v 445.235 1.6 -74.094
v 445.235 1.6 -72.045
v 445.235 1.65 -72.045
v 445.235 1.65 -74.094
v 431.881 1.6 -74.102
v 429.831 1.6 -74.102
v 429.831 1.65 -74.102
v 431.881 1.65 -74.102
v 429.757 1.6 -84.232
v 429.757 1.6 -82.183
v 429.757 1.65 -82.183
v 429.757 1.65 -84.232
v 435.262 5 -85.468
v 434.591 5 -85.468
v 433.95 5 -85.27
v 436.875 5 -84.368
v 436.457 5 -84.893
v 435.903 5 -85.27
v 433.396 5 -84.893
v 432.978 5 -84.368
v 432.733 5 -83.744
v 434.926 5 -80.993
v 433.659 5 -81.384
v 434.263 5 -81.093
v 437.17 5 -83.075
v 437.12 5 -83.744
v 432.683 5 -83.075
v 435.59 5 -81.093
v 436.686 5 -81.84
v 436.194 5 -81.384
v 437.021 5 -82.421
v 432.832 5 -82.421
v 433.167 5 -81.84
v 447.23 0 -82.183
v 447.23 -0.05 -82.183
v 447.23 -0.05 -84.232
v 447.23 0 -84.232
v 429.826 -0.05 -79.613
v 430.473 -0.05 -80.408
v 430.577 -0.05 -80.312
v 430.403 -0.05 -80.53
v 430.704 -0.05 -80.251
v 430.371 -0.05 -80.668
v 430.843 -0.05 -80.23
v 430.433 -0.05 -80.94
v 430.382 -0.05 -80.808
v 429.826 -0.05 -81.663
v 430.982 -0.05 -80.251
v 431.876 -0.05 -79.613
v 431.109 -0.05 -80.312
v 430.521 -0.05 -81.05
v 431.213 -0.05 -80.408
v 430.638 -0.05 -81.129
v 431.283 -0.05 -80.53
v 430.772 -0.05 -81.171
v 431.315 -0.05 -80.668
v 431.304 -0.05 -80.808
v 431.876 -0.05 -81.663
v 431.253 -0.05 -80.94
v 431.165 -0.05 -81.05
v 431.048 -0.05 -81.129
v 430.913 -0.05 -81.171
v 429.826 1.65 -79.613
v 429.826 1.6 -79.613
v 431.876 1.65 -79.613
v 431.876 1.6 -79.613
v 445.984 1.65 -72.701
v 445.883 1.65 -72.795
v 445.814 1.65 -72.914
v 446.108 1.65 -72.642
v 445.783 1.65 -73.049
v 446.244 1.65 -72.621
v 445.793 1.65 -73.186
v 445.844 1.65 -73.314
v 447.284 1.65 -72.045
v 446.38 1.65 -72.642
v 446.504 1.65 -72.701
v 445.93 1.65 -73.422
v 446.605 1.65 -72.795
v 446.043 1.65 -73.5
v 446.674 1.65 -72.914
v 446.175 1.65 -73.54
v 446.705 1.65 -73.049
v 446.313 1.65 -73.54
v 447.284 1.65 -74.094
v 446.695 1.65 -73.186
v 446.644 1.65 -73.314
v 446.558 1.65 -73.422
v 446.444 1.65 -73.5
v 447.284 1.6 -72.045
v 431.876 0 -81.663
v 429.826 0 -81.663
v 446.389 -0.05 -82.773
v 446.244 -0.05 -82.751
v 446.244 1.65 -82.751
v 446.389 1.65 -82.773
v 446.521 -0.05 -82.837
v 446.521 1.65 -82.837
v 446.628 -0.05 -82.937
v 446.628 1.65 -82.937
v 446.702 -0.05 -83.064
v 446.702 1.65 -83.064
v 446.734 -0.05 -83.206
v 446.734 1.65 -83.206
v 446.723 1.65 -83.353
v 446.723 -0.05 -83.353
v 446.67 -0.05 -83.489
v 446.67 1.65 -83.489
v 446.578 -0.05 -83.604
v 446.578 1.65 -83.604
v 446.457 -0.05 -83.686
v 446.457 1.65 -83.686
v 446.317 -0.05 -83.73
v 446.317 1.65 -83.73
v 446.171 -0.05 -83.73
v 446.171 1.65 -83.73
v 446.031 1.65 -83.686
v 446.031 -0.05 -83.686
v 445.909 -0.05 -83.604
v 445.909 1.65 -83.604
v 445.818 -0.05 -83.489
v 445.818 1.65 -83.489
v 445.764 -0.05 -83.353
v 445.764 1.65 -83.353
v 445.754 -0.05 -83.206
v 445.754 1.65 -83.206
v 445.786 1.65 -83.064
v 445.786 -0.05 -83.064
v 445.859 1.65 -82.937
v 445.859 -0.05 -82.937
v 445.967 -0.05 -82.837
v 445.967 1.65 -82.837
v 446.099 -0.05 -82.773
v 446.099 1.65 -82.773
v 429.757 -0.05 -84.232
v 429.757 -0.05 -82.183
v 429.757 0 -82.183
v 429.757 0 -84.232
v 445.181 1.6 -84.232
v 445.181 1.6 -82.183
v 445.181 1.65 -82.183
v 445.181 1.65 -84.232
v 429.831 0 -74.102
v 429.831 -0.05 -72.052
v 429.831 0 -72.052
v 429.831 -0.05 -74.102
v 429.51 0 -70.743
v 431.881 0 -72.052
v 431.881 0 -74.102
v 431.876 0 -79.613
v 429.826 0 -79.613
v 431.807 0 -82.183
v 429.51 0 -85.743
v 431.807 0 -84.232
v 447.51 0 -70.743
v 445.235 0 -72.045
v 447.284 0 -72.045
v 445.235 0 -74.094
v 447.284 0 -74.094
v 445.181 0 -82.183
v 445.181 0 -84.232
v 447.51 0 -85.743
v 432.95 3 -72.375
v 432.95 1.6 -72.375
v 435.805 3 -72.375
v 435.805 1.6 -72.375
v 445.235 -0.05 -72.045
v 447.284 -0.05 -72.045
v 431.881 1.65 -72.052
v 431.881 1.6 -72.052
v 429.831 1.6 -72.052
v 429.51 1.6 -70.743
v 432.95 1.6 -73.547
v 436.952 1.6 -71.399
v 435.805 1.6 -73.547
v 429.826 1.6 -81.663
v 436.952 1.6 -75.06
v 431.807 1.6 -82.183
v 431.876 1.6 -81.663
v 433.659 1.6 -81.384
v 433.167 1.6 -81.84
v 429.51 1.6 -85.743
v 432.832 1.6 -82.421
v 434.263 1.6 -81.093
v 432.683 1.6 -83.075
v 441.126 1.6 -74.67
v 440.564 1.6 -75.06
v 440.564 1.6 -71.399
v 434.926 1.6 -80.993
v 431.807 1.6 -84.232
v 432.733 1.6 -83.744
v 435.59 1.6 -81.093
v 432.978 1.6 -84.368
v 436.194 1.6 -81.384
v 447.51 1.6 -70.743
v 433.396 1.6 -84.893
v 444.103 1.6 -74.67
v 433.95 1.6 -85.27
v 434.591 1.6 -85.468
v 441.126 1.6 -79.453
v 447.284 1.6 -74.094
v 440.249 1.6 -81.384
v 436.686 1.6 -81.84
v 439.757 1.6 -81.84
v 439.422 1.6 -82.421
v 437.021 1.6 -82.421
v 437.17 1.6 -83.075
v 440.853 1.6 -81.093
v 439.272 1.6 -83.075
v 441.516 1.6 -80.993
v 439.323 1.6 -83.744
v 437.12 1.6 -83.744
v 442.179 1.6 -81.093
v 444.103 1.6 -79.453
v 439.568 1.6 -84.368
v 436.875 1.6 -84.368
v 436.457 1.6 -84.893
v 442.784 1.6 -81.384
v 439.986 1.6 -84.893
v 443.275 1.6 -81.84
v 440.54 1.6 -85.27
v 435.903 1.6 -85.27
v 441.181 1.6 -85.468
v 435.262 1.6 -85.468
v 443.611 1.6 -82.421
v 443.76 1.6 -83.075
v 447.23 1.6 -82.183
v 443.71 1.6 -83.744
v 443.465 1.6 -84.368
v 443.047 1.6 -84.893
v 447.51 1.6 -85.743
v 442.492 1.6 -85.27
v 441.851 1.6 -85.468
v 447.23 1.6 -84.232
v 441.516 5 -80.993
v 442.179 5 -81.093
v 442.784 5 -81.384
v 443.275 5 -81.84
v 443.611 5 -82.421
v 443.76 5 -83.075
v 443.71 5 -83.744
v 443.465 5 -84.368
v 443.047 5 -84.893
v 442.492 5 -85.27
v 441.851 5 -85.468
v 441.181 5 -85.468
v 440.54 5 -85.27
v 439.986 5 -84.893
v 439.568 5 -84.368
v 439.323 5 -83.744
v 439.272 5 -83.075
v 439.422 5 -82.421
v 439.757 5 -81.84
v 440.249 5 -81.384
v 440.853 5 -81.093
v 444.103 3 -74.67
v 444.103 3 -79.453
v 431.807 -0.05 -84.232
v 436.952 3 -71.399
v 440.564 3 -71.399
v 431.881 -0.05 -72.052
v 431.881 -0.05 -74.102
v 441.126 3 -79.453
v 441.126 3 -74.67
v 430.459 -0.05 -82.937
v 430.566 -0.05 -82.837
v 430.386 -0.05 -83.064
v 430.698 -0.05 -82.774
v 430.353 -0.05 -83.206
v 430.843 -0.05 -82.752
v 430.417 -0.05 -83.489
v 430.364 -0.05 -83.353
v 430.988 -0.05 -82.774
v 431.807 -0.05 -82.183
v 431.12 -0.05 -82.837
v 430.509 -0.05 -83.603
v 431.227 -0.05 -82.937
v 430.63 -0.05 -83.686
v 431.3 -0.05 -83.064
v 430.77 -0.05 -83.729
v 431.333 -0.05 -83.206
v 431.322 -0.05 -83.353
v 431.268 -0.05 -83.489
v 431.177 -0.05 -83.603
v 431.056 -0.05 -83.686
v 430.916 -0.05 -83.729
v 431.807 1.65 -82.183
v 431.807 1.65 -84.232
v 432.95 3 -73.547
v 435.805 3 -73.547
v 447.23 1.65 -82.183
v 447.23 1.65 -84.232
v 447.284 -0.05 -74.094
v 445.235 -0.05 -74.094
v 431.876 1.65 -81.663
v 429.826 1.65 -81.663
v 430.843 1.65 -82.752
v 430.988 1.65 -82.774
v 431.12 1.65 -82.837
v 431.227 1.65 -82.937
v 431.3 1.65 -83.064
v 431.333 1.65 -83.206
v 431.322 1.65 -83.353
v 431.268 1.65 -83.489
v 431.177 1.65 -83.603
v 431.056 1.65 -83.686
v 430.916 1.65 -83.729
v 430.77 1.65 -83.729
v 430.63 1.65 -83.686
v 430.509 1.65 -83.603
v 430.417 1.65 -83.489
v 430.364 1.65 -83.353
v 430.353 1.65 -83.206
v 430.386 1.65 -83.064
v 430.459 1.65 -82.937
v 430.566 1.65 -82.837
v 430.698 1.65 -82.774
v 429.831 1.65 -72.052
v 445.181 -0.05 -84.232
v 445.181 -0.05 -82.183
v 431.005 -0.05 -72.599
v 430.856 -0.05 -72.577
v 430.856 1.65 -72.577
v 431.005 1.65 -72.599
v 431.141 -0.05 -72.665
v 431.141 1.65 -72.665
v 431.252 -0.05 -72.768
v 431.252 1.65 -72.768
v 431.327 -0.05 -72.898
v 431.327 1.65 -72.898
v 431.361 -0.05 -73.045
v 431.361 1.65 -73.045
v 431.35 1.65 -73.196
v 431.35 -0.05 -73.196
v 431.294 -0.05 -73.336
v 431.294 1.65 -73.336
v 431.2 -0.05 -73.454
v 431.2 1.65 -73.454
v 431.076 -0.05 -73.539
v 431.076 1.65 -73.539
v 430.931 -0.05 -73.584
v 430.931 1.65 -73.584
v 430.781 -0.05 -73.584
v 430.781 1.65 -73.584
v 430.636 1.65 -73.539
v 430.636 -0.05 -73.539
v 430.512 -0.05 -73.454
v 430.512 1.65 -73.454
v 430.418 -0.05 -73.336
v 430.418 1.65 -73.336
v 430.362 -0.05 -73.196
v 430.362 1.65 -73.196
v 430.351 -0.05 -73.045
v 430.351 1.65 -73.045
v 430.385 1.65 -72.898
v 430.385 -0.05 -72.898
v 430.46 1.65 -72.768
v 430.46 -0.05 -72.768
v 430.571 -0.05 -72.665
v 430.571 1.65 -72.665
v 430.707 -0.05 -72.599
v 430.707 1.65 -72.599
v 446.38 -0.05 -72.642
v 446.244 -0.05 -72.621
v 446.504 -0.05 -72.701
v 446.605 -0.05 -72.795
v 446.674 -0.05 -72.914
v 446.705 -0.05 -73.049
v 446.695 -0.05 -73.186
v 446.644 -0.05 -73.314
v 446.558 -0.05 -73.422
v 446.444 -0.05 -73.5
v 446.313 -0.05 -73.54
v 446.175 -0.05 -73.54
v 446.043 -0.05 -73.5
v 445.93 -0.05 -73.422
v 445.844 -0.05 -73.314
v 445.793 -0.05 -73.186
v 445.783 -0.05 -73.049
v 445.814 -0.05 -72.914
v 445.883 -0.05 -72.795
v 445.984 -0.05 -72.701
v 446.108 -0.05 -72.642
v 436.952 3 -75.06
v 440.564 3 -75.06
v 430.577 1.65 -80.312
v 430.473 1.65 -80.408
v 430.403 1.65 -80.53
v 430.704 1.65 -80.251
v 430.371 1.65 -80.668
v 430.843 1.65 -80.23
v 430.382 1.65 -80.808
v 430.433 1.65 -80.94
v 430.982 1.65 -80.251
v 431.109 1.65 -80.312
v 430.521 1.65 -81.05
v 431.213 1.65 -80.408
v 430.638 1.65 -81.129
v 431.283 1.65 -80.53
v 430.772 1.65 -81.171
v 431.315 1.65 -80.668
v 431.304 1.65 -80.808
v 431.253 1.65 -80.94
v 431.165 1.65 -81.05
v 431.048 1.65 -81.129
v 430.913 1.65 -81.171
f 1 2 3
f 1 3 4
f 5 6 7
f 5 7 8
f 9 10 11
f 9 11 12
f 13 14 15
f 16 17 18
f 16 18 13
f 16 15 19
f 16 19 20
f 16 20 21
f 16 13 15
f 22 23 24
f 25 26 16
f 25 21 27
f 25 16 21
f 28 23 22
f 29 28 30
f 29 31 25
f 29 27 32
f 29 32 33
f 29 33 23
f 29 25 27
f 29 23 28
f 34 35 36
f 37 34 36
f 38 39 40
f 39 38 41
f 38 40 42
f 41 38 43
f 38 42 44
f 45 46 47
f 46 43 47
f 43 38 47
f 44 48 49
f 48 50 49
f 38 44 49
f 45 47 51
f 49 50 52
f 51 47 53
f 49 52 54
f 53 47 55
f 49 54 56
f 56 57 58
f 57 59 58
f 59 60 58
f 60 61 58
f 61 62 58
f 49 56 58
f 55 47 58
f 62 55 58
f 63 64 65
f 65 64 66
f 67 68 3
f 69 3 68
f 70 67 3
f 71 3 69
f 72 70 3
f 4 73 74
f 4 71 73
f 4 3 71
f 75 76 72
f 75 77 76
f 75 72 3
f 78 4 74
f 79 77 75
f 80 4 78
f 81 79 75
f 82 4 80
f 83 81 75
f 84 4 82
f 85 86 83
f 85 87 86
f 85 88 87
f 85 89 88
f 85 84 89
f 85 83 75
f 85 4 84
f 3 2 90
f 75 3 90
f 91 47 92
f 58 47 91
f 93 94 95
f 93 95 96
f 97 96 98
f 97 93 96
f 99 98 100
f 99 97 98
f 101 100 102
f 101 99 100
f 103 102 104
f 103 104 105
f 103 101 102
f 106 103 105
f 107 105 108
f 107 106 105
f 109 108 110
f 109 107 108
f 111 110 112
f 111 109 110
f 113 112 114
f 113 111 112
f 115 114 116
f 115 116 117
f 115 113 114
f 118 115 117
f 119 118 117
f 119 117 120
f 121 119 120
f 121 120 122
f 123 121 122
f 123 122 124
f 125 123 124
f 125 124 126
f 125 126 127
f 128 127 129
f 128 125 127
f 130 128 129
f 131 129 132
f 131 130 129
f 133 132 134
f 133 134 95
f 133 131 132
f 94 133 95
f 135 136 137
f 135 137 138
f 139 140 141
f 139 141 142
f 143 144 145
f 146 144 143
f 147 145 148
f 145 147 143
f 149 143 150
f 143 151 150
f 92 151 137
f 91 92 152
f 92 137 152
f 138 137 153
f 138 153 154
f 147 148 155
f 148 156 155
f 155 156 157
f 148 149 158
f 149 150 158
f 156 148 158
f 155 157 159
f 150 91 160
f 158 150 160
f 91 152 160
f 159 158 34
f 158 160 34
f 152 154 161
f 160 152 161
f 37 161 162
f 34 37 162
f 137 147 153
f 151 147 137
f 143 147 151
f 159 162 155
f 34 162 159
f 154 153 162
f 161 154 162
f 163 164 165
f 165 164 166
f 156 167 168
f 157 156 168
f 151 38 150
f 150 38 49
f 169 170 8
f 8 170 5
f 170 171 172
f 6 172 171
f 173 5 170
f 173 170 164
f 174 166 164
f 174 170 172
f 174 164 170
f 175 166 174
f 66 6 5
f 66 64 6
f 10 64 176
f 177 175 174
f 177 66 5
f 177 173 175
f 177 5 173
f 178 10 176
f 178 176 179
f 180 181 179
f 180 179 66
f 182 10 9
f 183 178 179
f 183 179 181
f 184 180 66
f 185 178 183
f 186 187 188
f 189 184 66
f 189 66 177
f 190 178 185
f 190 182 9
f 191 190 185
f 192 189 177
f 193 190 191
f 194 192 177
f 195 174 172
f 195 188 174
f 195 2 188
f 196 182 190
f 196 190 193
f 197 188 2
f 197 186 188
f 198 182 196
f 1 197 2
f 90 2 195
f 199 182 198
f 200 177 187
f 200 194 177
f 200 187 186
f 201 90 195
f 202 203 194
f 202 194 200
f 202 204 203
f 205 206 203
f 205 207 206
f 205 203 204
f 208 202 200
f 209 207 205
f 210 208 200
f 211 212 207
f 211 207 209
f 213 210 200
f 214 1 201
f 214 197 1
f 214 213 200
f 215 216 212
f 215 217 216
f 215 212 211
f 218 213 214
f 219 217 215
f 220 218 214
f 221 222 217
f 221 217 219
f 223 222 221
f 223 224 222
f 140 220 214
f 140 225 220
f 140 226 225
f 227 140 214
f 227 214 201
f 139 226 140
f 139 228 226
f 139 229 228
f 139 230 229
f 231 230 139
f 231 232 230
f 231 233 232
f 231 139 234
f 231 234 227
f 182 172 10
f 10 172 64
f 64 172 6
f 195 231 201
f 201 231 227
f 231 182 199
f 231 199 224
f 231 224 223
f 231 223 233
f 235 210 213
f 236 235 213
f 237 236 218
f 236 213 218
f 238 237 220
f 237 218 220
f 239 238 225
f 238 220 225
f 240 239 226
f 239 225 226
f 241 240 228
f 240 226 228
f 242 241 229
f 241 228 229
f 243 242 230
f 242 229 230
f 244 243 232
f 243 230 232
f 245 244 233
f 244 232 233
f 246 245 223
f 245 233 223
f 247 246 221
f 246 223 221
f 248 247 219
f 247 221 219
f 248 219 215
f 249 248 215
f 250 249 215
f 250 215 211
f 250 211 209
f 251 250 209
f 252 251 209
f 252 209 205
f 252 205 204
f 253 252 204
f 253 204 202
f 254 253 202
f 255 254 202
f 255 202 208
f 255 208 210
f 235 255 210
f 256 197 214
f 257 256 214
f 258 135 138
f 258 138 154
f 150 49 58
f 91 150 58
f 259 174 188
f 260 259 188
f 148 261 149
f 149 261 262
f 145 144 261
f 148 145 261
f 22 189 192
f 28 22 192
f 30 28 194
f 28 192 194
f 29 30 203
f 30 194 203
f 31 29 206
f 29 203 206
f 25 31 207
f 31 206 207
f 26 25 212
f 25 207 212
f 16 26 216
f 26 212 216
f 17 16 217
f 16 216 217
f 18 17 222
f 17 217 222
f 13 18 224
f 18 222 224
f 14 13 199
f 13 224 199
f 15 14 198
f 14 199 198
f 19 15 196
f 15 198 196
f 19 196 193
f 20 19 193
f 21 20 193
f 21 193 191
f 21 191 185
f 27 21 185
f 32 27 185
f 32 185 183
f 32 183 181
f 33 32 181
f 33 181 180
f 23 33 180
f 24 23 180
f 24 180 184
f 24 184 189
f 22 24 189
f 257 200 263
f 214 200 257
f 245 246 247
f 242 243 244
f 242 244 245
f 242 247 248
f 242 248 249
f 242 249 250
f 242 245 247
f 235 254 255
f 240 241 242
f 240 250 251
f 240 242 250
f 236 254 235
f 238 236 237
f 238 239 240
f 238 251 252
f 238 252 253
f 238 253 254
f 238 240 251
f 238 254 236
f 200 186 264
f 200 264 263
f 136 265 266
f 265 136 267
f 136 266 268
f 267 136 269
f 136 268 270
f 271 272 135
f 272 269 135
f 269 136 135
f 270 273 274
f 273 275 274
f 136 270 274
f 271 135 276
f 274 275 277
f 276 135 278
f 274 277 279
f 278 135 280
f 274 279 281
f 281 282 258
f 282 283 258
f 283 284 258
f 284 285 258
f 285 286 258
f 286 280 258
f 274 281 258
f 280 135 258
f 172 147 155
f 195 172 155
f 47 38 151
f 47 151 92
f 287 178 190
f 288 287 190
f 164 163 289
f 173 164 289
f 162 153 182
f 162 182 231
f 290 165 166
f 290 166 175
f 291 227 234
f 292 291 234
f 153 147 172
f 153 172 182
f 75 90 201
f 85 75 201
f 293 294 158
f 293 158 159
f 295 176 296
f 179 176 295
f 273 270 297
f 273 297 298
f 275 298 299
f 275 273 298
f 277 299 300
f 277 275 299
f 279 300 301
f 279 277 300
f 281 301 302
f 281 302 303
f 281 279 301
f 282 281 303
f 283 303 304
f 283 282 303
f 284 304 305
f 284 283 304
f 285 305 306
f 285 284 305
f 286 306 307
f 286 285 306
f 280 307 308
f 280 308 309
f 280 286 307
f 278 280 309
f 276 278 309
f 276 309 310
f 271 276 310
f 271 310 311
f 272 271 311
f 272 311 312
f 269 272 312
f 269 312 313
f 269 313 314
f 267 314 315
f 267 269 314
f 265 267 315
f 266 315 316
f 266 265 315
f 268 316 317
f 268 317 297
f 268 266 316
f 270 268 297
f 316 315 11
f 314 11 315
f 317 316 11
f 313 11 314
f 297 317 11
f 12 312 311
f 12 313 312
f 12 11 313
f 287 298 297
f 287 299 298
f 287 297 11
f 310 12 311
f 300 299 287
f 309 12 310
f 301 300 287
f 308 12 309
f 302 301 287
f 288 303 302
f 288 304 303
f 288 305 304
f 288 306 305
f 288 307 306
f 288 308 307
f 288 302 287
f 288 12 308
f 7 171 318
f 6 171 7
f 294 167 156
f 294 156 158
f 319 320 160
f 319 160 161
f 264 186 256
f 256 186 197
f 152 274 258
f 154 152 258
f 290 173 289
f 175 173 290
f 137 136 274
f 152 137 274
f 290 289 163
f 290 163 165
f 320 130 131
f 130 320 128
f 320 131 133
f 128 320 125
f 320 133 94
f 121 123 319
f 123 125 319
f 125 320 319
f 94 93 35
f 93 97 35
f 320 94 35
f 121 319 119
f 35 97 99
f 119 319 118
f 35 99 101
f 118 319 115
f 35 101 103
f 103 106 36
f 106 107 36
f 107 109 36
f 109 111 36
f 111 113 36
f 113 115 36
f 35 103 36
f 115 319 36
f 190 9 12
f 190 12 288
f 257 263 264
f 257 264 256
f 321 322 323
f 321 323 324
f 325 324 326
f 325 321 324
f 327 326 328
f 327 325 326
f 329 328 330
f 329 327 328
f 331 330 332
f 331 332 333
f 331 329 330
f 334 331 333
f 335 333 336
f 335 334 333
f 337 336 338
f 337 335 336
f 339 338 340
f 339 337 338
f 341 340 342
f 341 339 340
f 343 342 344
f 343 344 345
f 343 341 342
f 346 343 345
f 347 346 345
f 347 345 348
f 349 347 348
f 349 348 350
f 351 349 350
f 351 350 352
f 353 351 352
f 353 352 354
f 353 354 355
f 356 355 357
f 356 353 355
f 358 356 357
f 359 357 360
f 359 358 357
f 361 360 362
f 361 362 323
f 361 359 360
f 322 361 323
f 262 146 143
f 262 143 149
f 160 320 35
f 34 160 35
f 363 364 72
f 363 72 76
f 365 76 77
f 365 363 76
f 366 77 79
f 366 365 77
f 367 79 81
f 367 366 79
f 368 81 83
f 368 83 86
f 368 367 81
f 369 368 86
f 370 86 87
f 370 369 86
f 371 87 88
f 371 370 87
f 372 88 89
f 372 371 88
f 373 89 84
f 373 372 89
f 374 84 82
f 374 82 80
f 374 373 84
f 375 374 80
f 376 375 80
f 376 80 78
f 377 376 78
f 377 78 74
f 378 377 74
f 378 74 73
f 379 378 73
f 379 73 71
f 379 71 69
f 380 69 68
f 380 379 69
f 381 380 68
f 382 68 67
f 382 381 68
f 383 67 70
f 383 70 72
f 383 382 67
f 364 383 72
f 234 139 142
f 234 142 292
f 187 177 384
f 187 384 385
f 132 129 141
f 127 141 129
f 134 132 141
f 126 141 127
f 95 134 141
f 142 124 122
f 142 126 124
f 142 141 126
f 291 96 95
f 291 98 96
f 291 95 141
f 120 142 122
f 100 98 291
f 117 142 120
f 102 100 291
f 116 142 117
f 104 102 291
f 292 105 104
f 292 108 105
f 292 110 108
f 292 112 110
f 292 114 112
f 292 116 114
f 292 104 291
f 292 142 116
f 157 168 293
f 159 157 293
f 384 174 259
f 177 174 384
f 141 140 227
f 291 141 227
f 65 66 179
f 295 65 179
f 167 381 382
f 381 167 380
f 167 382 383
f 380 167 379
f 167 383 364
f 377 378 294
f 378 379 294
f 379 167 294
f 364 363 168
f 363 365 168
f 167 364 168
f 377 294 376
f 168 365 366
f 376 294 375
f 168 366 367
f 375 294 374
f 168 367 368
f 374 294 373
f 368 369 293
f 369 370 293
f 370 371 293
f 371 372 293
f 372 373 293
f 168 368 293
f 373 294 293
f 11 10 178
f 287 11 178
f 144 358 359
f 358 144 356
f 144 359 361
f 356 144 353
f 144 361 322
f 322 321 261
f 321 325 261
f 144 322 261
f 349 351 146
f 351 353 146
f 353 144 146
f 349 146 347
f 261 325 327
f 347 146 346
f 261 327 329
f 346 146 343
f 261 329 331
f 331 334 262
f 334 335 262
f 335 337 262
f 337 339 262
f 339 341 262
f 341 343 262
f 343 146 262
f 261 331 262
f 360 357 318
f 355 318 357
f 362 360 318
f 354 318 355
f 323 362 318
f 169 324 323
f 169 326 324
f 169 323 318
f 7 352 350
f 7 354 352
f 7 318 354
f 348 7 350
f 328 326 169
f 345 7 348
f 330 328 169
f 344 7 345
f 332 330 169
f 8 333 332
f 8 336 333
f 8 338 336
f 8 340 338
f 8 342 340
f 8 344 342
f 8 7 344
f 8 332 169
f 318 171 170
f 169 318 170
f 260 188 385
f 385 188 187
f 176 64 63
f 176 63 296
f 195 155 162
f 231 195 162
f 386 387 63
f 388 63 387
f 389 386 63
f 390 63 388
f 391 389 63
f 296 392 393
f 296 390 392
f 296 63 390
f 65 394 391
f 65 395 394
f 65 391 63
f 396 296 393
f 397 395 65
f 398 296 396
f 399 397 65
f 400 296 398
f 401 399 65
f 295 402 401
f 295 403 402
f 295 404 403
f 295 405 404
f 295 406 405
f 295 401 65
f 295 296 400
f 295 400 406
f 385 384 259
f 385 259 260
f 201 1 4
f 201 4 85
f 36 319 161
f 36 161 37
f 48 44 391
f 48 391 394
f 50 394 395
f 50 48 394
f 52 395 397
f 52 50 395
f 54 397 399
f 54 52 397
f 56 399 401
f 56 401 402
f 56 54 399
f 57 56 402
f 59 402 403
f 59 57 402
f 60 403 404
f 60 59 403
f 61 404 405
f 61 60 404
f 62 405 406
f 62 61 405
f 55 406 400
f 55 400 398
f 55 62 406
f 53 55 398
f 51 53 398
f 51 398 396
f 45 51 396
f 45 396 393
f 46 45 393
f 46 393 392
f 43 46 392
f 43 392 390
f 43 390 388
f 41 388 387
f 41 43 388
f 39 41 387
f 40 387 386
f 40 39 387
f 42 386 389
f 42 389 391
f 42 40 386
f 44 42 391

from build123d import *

# Parameters (mm, degrees)
SKETCH1_W                = 18
SKETCH1_H                = 15
SKETCH1_W_2              = 2.049458383
SKETCH1_H_2              = 2.049458384
SKETCH1_W_3              = 2.855539704
SKETCH1_H_3              = 1.171503468
SKETCH1_W_4              = 3.612135694
SKETCH1_H_4              = 3.660948338
SKETCH1_H_5              = 2.049458383
SKETCH1_W_5              = 2.977571315
SKETCH1_H_6              = 4.783639162
SKETCH1_W_6              = 2.049458384
SKETCH1_R                = 2.25
BOSS_EXTRUDE1_DEPTH      = 1.6
BOSS_EXTRUDE2_DEPTH      = 1.65
BOSS_EXTRUDE2_DEPTH_BACK = 0.05
SKETCH1_3_W              = 2.049458383
SKETCH1_3_H              = 2.049458383
SKETCH1_3_R              = 0.491297767
SKETCH1_3_W_2            = 2.049458384
SKETCH1_3_R_2            = 0.472938465
SKETCH1_3_H_2            = 2.049458384
SKETCH1_3_R_3            = 0.506268972
SKETCH1_3_R_4            = 0.49179988
SKETCH1_3_R_5            = 0.462232329
SKETCH1_4_R              = 2.25
BOSS_EXTRUDE3_DEPTH      = 5
SKETCH1_5_W              = 2.977571315
SKETCH1_5_H              = 4.783639162
SKETCH1_5_W_2            = 3.612135694
SKETCH1_5_H_2            = 3.660948338
SKETCH1_5_W_3            = 2.855539704
SKETCH1_5_H_3            = 1.171503468
BOSS_EXTRUDE4_DEPTH      = 3


with BuildPart() as part:
    # Sketch1 → Boss-Extrude1 (new body)
    with BuildSketch(Plane(origin=(0, 0, 0), x_dir=(1, 0, 0), z_dir=(0, 1, 0))):
        with Locations((438.509935884, 78.243204781)):
            Rectangle(SKETCH1_W, SKETCH1_H)
        with Locations((430.855961247, 73.0772243)):
            Rectangle(SKETCH1_W_2, SKETCH1_H_2, mode=Mode.SUBTRACT)
        with Locations((434.377292894, 72.961183722)):
            Rectangle(SKETCH1_W_3, SKETCH1_H_3, mode=Mode.SUBTRACT)
        with Locations((438.758227739, 73.229653267)):
            Rectangle(SKETCH1_W_4, SKETCH1_H_4, mode=Mode.SUBTRACT)
        with Locations((446.259482022, 73.069490495)):
            Rectangle(SKETCH1_W_2, SKETCH1_H_5, mode=Mode.SUBTRACT)
        with Locations((442.614426656, 77.061445861)):
            Rectangle(SKETCH1_W_5, SKETCH1_H_6, mode=Mode.SUBTRACT)
        with Locations((430.850957935, 80.638087475)):
            Rectangle(SKETCH1_W_6, SKETCH1_H_5, mode=Mode.SUBTRACT)
        with Locations((430.782103127, 83.20757709)):
            Rectangle(SKETCH1_W_2, SKETCH1_H_5, mode=Mode.SUBTRACT)
        with Locations((434.926435145, 83.243204781)):
            Circle(SKETCH1_R, mode=Mode.SUBTRACT)
        with Locations((441.516142154, 83.243204781)):
            Circle(SKETCH1_R, mode=Mode.SUBTRACT)
        with Locations((446.205622618, 83.20757709)):
            Rectangle(SKETCH1_W_2, SKETCH1_H_5, mode=Mode.SUBTRACT)
    extrude(amount=BOSS_EXTRUDE1_DEPTH)

    # Sketch1<3> → Boss-Extrude2 (add, two sides: drawn at the far end of the back side and taken through both)
    # profile 1 of 5: a face of its own
    with BuildSketch(Plane(origin=(0, 0, 0), x_dir=(1, 0, 0), z_dir=(0, 1, 0)).offset(-BOSS_EXTRUDE2_DEPTH_BACK)):
        with Locations((430.782103127, 83.20757709)):
            Rectangle(SKETCH1_3_W, SKETCH1_3_H)
        with Locations((430.842964154, 83.243204781)):
            Circle(SKETCH1_3_R, mode=Mode.SUBTRACT)
    # profile 2 of 5: a face of its own
    with BuildSketch(Plane(origin=(0, 0, 0), x_dir=(1, 0, 0), z_dir=(0, 1, 0)).offset(-BOSS_EXTRUDE2_DEPTH_BACK)):
        with Locations((430.850957935, 80.638087475)):
            Rectangle(SKETCH1_3_W_2, SKETCH1_3_H)
        with Locations((430.842964154, 80.703204781)):
            Circle(SKETCH1_3_R_2, mode=Mode.SUBTRACT)
    # profile 3 of 5: a face of its own
    with BuildSketch(Plane(origin=(0, 0, 0), x_dir=(1, 0, 0), z_dir=(0, 1, 0)).offset(-BOSS_EXTRUDE2_DEPTH_BACK)):
        with Locations((430.855961247, 73.0772243)):
            Rectangle(SKETCH1_3_W, SKETCH1_3_H_2)
        with Locations((430.855961247, 73.083204781)):
            Circle(SKETCH1_3_R_3, mode=Mode.SUBTRACT)
    # profile 4 of 5: a face of its own
    with BuildSketch(Plane(origin=(0, 0, 0), x_dir=(1, 0, 0), z_dir=(0, 1, 0)).offset(-BOSS_EXTRUDE2_DEPTH_BACK)):
        with Locations((446.205622618, 83.20757709)):
            Rectangle(SKETCH1_3_W, SKETCH1_3_H)
        with Locations((446.243933423, 83.243204781)):
            Circle(SKETCH1_3_R_4, mode=Mode.SUBTRACT)
    # profile 5 of 5: a face of its own
    with BuildSketch(Plane(origin=(0, 0, 0), x_dir=(1, 0, 0), z_dir=(0, 1, 0)).offset(-BOSS_EXTRUDE2_DEPTH_BACK)):
        with Locations((446.259482022, 73.069490495)):
            Rectangle(SKETCH1_3_W, SKETCH1_3_H)
        with Locations((446.243933423, 73.083204781)):
            Circle(SKETCH1_3_R_5, mode=Mode.SUBTRACT)
    extrude(amount=BOSS_EXTRUDE2_DEPTH + BOSS_EXTRUDE2_DEPTH_BACK)

    # Sketch1<4> → Boss-Extrude3 (add)
    with BuildSketch(Plane(origin=(0, 0, 0), x_dir=(1, 0, 0), z_dir=(0, 1, 0))):
        with Locations((434.926435145, 83.243204781)):
            Circle(SKETCH1_4_R)
        with Locations((441.516142154, 83.243204781)):
            Circle(SKETCH1_4_R)
    extrude(amount=BOSS_EXTRUDE3_DEPTH)

    # Sketch1<5> → Boss-Extrude4 (add)
    with BuildSketch(Plane(origin=(0, 0, 0), x_dir=(1, 0, 0), z_dir=(0, 1, 0))):
        with Locations((442.614426656, 77.061445861)):
            Rectangle(SKETCH1_5_W, SKETCH1_5_H)
        with Locations((438.758227739, 73.229653267)):
            Rectangle(SKETCH1_5_W_2, SKETCH1_5_H_2)
        with Locations((434.377292894, 72.961183722)):
            Rectangle(SKETCH1_5_W_3, SKETCH1_5_H_3)
    extrude(amount=BOSS_EXTRUDE4_DEPTH)


solid = part.part
